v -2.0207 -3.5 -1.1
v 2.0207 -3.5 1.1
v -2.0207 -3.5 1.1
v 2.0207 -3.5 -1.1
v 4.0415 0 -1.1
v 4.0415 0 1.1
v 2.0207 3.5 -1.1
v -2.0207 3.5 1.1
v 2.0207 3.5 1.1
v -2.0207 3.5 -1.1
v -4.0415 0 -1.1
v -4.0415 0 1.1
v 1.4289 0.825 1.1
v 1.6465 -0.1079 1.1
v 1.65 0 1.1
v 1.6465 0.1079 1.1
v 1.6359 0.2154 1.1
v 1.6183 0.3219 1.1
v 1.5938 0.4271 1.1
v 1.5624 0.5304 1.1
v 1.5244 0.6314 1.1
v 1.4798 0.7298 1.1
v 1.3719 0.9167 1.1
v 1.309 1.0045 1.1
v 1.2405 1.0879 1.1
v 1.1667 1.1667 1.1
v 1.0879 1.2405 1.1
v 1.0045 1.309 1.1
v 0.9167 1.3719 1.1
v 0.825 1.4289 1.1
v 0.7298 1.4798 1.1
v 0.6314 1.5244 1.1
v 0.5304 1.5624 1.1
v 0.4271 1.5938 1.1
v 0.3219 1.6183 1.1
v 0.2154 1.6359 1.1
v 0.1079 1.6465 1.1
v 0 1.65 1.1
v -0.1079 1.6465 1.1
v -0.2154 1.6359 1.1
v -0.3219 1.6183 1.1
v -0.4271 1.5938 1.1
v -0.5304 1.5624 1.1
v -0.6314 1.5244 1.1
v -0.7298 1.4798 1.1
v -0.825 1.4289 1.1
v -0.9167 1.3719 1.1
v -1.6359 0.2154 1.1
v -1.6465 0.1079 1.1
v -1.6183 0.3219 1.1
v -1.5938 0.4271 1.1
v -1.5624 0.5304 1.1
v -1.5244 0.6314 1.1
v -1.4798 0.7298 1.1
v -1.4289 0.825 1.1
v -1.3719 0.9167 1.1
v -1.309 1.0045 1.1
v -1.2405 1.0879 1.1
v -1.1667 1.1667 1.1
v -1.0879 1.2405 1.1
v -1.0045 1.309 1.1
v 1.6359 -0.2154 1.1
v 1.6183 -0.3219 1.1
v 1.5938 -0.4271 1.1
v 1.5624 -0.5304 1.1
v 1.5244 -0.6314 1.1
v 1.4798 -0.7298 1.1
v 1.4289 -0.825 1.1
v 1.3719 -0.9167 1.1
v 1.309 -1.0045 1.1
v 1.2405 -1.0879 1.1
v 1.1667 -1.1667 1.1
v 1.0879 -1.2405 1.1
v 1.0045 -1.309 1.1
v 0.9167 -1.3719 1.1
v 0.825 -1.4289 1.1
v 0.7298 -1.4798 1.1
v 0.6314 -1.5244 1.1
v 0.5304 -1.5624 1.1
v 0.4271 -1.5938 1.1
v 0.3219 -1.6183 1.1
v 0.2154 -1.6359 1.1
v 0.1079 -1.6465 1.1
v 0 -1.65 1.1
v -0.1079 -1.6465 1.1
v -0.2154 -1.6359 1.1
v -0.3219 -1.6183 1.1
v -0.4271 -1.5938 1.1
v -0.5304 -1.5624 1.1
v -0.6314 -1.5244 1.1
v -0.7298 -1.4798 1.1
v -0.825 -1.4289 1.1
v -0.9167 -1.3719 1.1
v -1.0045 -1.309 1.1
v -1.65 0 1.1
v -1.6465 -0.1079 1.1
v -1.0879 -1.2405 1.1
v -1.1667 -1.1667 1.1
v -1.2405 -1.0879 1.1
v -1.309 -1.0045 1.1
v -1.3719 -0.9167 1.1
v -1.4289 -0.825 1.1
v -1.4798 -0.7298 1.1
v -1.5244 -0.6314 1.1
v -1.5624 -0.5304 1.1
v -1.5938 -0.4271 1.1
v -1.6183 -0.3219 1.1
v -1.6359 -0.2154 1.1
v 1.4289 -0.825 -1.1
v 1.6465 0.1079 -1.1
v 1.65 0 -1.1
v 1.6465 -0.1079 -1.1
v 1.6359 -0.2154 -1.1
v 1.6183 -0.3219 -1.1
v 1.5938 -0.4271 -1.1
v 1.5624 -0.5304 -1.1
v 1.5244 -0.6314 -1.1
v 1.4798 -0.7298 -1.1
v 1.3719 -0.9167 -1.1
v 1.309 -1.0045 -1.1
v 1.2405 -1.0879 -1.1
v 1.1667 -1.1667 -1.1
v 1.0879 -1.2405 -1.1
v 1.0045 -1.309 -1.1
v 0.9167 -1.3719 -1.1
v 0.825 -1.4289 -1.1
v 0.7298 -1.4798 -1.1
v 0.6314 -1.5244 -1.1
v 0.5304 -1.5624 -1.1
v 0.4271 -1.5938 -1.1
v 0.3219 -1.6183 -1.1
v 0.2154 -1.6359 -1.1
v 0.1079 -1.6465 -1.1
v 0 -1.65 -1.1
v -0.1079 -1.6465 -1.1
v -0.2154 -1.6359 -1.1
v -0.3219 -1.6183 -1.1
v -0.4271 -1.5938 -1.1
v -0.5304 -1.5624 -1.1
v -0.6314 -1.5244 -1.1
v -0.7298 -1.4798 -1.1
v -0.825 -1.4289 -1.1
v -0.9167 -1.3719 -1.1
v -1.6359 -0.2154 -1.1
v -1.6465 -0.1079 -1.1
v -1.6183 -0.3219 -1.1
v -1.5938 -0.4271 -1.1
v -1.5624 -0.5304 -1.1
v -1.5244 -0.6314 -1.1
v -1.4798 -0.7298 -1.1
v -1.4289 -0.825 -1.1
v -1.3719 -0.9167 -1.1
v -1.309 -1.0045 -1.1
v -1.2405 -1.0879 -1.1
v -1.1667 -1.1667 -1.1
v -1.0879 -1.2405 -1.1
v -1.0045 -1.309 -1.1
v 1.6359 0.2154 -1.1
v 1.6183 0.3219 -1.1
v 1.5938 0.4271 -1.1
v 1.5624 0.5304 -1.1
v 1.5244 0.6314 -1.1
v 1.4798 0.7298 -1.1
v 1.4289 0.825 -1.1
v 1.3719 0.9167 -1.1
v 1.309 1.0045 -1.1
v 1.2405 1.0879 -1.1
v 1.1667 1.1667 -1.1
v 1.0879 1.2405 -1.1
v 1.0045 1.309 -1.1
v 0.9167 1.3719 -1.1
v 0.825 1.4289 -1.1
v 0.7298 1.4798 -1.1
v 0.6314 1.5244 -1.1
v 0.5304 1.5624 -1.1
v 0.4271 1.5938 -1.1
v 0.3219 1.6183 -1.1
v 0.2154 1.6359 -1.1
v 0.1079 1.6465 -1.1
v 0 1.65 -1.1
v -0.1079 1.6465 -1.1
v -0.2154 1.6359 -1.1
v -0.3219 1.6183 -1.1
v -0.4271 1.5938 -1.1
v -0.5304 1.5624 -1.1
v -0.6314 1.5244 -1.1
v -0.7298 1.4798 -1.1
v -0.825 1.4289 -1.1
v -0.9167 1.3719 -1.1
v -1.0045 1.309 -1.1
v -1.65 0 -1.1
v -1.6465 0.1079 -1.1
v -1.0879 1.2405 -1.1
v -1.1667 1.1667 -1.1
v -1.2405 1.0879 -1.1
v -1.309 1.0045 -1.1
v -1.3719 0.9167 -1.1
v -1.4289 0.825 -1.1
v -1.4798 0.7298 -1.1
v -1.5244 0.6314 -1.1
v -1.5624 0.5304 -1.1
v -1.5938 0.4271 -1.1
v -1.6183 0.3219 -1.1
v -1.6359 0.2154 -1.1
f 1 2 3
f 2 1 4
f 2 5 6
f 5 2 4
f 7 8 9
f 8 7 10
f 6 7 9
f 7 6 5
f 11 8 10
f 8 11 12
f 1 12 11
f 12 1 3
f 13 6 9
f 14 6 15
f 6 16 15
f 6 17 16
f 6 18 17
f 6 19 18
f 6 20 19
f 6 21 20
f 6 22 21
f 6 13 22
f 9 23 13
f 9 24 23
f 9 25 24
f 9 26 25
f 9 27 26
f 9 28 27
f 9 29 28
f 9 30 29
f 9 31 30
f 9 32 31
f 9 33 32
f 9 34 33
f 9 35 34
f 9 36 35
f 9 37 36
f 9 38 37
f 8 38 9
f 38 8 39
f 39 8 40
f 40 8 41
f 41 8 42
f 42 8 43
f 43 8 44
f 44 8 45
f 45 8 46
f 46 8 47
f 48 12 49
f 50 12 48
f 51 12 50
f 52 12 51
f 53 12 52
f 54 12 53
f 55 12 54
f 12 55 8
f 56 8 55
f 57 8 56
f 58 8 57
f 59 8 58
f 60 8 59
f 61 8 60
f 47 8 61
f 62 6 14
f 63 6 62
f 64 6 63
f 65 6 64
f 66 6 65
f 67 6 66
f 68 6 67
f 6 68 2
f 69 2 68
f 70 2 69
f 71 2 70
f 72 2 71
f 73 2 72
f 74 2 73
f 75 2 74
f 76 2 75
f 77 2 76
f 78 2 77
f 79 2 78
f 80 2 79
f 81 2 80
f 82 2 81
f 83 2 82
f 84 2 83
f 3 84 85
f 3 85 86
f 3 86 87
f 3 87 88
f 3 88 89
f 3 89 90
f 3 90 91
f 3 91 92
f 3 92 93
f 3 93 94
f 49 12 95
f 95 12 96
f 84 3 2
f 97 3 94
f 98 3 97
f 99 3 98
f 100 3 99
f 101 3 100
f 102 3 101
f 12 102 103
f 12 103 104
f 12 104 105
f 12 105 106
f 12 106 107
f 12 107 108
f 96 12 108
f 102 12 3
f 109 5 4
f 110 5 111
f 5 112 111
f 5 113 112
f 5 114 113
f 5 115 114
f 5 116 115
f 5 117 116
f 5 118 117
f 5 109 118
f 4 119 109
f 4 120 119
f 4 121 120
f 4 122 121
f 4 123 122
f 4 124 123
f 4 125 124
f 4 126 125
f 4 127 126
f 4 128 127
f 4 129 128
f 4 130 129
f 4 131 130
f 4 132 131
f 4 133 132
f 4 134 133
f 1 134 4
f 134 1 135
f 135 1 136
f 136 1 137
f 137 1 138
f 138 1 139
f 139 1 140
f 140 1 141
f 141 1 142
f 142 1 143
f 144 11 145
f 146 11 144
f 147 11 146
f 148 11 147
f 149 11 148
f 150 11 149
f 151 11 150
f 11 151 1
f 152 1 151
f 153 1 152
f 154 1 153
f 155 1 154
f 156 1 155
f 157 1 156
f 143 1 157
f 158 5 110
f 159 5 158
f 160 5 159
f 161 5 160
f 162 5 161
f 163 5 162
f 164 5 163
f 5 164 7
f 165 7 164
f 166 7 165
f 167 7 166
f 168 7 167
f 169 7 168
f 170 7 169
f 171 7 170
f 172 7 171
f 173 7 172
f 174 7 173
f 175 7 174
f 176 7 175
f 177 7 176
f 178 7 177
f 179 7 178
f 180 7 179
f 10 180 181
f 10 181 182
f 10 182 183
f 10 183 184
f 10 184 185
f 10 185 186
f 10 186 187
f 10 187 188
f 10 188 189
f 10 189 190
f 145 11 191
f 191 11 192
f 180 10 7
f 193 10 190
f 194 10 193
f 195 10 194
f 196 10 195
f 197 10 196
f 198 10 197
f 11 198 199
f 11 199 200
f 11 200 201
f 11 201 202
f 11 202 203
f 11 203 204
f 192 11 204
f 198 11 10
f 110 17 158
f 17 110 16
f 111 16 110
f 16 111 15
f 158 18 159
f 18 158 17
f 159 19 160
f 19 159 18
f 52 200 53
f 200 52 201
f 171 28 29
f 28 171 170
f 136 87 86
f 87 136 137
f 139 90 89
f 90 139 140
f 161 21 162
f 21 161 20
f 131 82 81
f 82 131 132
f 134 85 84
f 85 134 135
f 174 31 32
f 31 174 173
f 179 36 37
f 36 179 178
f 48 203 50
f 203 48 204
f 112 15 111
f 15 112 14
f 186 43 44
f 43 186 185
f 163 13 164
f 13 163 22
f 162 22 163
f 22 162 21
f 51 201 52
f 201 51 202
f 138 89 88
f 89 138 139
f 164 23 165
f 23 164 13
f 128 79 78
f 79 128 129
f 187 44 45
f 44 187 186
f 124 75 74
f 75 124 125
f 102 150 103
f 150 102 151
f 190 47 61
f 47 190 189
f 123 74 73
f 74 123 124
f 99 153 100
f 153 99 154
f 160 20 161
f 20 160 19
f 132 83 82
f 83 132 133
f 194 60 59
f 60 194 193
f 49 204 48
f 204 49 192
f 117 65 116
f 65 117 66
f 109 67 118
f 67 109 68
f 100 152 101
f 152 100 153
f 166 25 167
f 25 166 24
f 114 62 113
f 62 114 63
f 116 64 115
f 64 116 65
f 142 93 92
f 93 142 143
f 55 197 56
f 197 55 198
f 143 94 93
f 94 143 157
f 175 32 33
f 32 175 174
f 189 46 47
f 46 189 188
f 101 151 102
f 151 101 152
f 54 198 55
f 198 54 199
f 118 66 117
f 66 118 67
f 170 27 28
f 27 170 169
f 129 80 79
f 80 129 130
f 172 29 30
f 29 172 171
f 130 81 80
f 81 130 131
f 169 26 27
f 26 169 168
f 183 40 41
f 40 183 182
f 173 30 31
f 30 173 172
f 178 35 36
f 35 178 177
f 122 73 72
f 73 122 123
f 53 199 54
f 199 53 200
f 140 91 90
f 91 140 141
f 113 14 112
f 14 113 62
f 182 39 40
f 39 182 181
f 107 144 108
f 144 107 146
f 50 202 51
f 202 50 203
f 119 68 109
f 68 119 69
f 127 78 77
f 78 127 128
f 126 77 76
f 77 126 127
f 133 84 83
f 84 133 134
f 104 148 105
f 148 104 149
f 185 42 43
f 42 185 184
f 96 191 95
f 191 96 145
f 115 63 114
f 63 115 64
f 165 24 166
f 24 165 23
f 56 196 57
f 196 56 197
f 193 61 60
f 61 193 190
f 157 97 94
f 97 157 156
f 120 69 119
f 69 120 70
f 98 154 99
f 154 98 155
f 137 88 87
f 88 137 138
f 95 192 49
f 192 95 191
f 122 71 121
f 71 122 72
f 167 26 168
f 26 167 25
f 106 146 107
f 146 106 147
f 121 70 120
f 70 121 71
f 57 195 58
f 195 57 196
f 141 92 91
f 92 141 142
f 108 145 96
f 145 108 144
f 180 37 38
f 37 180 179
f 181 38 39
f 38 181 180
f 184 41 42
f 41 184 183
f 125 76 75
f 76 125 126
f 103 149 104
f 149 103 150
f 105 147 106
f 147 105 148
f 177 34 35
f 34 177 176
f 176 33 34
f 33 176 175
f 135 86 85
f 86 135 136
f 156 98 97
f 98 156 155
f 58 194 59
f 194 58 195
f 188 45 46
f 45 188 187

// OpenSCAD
// Thin hex nut for M4 screw
// Requirements: 7.0mm across flats, 2.2mm thick, circular M4 hole (tap/clearance selectable)
// Output: ONE connected solid (nut only; no washer/flange)

thread_nominal_diameter_mm = 4.0; //[2.0:8.0:0.1]
across_flats_mm = 7.0;            //[3.5:14.0:0.1]
thickness_mm = 2.2;               //[1.1:4.4:0.1]

// hole_type: 0 = tap hole, 1 = clearance hole
hole_type = 0;                    //[0:1:1]
tap_hole_diameter_mm = 3.3;       //[2.0:4.0:0.05]
clearance_hole_diameter_mm = 4.5; //[4.0:5.5:0.05]

$fn = 96;

eps = 0.02;

// Convert across-flats (AF) to circumradius (distance from center to vertex) for a hex:
// AF = 2 * apothem, apothem = R * cos(30) => R = AF / (2*cos(30))
hex_circumradius_mm = across_flats_mm / (2 * cos(30));

hole_diameter_mm = (hole_type == 0) ? tap_hole_diameter_mm : clearance_hole_diameter_mm;

module thin_hex_nut() {
    difference() {
        // Plain hex body (no flange/washer)
        cylinder(r = hex_circumradius_mm, h = thickness_mm, center = true, $fn = 6);

        // Circular through-hole
        cylinder(d = hole_diameter_mm, h = thickness_mm + 2*eps, center = true, $fn = 96);
    }
}

thin_hex_nut();
